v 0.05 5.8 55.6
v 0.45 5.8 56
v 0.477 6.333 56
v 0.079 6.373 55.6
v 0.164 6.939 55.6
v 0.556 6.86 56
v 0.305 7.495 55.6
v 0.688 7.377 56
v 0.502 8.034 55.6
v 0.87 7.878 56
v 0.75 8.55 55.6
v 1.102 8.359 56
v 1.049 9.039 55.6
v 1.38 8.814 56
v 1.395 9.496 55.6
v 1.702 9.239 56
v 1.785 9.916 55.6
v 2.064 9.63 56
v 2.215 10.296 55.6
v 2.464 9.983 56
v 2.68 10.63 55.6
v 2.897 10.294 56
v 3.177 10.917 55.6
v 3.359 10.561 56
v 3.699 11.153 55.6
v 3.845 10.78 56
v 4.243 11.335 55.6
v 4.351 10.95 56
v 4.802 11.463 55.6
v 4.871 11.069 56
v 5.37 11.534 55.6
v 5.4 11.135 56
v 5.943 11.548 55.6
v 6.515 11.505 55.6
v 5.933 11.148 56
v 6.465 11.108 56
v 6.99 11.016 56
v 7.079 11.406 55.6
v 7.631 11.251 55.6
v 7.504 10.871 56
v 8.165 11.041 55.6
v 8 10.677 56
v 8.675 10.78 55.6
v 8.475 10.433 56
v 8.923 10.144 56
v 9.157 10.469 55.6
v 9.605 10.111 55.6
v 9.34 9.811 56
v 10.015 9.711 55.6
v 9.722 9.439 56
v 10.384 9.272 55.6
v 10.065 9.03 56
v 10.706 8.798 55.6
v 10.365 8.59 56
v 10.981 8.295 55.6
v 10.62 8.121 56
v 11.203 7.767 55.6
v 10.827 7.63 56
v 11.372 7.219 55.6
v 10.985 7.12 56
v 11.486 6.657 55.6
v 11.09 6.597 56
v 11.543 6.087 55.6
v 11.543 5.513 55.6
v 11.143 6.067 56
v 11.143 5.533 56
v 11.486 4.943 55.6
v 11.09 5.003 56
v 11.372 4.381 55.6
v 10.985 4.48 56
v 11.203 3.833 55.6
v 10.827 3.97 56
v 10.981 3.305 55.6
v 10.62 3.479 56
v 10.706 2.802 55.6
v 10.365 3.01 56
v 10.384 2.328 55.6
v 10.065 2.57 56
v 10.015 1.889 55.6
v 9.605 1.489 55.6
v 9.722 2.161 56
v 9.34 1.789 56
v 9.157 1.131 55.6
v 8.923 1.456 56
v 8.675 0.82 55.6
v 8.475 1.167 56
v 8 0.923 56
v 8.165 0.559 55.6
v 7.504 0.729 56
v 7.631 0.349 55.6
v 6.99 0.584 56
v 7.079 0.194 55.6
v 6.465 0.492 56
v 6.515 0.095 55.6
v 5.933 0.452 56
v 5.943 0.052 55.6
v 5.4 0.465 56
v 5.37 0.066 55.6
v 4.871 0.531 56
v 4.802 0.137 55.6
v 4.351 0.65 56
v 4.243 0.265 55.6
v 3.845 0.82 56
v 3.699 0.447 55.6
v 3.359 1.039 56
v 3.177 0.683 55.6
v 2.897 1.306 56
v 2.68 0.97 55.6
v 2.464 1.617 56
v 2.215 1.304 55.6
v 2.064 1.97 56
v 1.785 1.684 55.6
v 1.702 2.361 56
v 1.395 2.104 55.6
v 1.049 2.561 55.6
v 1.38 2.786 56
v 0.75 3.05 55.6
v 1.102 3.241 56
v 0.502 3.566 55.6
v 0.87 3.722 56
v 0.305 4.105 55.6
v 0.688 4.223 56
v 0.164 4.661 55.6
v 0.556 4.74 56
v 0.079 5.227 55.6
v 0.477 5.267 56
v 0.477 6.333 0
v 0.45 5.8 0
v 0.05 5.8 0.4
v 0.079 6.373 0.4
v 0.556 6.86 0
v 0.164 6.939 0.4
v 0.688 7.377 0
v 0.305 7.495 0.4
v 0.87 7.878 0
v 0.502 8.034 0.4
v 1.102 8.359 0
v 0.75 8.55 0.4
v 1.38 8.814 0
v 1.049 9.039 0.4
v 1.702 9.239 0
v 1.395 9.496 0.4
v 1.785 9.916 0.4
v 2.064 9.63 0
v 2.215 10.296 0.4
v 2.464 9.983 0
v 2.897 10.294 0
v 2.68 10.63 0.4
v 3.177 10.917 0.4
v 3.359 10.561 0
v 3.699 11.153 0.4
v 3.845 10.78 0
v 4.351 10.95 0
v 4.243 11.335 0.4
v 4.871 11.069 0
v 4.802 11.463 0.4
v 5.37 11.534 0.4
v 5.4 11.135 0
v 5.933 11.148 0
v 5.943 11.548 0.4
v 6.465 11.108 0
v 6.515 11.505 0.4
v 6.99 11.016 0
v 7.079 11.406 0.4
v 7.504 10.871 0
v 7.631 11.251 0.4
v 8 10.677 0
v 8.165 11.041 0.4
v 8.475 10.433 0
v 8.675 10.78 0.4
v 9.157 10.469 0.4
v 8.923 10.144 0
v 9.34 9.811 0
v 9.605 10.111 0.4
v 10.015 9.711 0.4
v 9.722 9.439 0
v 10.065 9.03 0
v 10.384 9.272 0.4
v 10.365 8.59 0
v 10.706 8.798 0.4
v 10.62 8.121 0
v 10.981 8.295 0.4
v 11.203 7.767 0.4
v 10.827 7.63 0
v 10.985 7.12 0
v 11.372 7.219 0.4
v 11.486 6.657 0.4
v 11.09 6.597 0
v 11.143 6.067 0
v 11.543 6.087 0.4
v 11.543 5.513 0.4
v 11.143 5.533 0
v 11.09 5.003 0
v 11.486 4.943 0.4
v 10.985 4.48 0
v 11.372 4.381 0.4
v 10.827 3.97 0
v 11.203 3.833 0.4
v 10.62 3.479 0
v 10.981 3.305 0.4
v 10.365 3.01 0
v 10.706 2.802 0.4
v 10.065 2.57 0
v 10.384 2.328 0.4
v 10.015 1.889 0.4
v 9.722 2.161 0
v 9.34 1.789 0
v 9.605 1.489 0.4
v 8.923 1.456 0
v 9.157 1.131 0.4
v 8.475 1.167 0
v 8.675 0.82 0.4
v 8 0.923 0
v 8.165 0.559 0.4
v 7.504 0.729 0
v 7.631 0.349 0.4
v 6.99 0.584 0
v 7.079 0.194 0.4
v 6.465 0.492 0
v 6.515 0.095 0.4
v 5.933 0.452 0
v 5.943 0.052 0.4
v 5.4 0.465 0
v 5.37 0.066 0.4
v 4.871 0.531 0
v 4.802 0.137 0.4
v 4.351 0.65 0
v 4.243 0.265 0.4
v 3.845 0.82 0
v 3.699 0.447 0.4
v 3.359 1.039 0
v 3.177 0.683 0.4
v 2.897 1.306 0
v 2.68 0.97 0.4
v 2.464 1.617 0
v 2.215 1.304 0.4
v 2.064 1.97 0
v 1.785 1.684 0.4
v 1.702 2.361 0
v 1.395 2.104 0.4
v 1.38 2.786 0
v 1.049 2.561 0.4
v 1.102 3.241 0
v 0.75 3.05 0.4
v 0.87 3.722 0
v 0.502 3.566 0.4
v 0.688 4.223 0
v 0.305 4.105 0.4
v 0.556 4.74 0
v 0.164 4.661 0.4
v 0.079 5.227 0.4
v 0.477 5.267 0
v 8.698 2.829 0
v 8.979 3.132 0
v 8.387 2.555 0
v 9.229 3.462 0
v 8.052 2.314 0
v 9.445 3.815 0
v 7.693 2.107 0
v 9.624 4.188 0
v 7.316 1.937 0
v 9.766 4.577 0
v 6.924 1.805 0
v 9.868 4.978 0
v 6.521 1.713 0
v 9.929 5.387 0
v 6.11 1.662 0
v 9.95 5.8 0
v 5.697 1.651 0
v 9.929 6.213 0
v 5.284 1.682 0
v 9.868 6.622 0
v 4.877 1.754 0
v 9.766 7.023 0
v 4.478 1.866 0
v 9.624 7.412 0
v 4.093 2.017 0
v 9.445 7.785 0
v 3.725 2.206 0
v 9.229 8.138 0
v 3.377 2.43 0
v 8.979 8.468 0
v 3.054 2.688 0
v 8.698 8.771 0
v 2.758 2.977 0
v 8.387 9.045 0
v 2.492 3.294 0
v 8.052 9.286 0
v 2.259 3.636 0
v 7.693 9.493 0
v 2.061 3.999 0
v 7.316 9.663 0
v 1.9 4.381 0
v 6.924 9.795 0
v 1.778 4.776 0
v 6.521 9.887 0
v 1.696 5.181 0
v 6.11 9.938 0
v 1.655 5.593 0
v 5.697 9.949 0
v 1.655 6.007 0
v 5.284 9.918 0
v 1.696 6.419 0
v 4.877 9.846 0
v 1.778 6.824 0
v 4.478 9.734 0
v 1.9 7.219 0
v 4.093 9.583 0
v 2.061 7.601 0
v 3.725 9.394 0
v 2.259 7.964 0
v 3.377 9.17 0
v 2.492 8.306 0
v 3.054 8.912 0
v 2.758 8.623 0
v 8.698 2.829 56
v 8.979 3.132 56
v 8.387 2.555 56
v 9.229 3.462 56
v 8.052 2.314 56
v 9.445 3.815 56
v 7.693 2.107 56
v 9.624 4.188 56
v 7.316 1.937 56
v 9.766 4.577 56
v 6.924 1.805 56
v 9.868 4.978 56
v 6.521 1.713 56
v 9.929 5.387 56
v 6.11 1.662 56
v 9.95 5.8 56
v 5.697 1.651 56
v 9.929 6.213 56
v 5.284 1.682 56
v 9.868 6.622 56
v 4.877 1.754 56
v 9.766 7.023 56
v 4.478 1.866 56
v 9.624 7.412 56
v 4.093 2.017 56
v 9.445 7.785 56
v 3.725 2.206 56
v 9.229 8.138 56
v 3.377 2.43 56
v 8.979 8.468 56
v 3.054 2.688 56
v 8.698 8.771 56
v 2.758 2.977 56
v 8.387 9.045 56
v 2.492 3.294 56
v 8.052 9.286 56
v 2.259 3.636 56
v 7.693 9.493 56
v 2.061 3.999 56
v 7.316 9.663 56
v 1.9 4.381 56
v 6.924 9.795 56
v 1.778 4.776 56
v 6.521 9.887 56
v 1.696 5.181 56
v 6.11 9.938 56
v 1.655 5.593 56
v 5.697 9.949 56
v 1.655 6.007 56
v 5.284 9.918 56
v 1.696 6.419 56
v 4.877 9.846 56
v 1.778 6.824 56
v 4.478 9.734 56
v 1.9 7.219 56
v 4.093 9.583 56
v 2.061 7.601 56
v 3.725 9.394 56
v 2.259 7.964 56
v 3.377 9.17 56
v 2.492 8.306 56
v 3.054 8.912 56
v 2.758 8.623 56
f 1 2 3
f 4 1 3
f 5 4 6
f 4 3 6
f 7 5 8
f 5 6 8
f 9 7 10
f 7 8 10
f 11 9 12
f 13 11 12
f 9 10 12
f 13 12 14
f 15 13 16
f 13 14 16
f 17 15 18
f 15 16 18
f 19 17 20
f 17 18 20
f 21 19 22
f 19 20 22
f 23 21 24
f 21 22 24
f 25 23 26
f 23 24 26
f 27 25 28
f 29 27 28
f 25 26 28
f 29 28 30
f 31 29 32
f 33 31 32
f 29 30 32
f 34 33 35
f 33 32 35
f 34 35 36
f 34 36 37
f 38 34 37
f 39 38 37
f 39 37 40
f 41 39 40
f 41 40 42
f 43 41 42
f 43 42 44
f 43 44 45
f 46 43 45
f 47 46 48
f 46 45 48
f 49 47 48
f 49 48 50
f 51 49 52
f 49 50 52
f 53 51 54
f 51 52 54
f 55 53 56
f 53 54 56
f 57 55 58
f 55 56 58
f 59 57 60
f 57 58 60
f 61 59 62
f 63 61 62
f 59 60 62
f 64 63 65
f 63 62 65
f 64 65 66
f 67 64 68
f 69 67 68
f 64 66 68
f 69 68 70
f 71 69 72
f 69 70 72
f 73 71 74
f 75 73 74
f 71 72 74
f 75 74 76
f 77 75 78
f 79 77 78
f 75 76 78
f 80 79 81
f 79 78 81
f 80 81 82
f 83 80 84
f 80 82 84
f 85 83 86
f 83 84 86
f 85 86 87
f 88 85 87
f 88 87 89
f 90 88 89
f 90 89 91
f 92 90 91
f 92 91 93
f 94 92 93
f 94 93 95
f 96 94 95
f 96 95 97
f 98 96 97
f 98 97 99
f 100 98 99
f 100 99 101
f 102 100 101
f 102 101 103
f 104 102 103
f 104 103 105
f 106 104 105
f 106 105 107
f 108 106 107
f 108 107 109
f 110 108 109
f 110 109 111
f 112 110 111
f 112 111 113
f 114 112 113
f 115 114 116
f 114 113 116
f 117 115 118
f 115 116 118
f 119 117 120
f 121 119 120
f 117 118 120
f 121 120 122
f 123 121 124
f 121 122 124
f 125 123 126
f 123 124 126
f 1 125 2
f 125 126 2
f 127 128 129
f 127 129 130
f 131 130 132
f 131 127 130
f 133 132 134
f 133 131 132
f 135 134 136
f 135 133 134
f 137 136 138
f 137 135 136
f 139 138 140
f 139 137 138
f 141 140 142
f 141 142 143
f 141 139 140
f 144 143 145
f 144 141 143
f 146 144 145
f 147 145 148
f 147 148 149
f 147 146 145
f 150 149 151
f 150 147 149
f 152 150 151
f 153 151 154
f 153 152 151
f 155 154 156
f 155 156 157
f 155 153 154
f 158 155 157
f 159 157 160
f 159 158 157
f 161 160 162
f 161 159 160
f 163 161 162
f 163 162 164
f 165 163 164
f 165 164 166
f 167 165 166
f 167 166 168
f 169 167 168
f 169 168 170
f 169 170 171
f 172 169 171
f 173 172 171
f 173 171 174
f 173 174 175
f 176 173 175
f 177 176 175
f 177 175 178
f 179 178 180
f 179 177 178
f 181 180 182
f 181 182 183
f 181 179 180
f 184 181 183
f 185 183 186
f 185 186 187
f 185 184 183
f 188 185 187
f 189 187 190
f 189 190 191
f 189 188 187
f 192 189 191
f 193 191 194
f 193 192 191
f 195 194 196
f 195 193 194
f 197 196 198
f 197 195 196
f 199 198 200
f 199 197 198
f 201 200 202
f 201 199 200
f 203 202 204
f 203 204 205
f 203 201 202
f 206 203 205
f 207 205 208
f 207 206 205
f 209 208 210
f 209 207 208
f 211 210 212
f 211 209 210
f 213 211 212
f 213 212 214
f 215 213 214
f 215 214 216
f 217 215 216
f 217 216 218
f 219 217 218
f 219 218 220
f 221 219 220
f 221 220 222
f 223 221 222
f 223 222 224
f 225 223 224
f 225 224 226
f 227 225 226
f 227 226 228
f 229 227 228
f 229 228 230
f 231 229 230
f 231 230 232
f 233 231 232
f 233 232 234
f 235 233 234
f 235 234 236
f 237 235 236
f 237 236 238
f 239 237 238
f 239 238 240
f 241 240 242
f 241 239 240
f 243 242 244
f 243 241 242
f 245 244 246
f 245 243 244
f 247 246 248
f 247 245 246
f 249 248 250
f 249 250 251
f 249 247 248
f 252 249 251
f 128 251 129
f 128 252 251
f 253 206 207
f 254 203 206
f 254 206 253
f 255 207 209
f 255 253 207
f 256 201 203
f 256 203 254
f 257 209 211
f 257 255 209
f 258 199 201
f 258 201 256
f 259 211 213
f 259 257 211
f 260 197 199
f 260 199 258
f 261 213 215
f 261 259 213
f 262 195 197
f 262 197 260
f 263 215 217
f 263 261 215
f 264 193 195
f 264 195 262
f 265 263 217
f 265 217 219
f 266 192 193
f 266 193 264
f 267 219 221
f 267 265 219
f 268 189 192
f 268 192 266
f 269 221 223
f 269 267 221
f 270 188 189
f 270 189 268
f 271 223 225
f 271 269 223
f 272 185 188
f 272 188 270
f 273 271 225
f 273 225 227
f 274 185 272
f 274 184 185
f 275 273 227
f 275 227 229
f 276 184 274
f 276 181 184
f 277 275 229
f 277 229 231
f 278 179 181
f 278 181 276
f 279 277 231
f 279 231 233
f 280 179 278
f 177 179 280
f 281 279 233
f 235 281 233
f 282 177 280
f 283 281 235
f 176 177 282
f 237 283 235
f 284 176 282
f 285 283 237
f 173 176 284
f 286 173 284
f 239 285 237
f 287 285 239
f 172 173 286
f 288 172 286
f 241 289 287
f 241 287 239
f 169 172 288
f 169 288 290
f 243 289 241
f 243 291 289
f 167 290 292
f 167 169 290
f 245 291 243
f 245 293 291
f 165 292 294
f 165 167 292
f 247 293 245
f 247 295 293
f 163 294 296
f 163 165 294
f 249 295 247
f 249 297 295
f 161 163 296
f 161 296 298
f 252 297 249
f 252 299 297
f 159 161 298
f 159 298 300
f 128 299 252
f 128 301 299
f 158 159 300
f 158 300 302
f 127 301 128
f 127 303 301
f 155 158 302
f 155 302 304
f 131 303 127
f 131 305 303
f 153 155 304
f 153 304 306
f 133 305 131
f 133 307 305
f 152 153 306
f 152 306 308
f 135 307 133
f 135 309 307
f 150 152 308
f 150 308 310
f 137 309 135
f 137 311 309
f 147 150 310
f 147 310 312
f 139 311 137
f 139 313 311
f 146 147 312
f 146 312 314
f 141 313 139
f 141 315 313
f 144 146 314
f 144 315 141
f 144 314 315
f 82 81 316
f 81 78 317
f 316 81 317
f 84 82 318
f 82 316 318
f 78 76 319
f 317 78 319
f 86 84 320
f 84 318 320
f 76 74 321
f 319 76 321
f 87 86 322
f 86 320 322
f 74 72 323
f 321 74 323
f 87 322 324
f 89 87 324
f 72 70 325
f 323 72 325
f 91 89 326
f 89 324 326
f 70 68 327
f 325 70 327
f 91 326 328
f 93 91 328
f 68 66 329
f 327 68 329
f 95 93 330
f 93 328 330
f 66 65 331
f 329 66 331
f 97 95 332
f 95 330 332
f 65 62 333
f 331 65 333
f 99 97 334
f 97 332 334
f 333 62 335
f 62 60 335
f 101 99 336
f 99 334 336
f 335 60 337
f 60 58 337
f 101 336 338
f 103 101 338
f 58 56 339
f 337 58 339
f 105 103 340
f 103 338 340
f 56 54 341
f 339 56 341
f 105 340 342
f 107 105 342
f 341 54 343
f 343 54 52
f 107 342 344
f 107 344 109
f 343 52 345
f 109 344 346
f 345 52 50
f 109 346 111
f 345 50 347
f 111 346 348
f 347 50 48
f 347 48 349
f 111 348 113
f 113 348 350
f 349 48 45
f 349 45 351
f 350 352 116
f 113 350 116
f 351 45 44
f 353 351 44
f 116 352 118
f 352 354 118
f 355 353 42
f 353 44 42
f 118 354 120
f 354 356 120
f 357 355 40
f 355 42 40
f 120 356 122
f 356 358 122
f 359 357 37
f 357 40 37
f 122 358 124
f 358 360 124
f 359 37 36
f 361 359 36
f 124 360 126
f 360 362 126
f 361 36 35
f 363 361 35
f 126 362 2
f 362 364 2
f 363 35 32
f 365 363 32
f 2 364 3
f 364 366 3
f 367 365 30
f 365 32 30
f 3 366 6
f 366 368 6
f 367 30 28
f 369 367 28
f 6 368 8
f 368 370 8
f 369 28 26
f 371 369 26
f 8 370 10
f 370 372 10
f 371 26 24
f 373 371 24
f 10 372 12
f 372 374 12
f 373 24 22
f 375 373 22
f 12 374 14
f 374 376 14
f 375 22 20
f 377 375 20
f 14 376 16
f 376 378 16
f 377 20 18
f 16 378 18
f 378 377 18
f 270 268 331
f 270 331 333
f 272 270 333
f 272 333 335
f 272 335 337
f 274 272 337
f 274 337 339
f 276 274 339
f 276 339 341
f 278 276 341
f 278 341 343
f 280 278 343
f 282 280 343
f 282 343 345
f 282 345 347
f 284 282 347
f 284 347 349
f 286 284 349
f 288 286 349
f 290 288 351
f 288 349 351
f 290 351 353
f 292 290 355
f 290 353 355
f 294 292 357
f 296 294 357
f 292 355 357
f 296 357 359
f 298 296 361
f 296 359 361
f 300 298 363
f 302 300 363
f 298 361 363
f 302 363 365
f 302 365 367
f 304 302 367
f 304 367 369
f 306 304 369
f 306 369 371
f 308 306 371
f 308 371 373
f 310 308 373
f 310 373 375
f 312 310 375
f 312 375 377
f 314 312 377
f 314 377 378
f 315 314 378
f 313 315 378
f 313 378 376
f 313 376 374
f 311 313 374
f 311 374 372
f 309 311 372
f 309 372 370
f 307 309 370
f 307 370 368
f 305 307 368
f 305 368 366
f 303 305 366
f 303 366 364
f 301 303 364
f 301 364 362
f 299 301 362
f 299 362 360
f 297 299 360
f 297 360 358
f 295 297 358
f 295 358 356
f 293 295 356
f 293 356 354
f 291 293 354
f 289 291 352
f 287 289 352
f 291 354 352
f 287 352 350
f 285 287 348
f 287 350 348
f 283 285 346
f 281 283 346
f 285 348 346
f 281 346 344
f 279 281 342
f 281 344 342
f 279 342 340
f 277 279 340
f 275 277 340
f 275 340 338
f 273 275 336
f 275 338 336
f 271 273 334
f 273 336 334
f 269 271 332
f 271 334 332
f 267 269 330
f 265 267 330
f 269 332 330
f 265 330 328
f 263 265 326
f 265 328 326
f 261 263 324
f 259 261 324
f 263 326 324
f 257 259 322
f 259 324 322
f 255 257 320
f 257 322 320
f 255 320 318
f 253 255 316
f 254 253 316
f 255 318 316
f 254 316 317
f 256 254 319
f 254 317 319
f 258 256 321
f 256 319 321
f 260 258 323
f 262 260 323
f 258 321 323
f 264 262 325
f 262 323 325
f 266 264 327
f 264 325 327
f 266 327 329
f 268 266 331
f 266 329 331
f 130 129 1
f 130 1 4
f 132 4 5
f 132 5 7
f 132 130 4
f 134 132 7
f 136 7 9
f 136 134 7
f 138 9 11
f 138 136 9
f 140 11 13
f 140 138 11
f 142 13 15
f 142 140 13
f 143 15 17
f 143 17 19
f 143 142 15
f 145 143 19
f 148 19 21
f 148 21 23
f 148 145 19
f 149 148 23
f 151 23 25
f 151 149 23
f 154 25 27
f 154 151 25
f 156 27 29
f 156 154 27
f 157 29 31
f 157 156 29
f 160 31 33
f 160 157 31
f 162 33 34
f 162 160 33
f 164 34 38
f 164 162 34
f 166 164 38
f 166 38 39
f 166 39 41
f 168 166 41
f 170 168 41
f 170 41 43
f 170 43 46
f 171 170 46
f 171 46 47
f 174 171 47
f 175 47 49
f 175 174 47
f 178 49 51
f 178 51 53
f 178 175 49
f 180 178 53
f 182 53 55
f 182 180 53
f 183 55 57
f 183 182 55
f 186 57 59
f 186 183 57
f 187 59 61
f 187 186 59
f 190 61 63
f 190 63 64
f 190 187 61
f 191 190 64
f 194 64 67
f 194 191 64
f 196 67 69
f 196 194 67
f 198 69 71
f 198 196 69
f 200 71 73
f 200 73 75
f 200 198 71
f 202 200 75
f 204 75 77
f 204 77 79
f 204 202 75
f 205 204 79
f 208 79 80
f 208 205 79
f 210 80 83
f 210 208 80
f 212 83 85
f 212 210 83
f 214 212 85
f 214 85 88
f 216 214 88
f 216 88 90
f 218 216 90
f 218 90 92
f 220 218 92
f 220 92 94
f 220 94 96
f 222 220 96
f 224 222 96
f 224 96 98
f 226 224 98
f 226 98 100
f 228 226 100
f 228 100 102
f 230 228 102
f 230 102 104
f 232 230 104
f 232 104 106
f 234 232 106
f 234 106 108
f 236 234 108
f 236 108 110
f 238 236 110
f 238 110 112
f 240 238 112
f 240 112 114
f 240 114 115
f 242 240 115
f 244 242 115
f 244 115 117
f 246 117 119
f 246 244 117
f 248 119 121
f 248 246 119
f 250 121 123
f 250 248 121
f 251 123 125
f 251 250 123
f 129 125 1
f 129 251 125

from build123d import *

# Parameters (mm, degrees)
CROQUIS1_R              = 5.75
SALIENTE_EXTRUIR1_DEPTH = 56
CROQUIS2_R              = 4.15
CORTAR_EXTRUIR1_DEPTH   = 59.333566666
CHAFL_N1_SIZE           = 0.4
CHAFL_N2_SIZE           = 0.4


with BuildPart() as part:
    # Croquis1 → Saliente-Extruir1 (new body)
    with BuildSketch(Plane(origin=(0, 0, 0), x_dir=(-1, 0, 0), z_dir=(0, 0, -1))):
        with Locations((-5.8, 5.8)):
            Circle(CROQUIS1_R)
    extrude(amount=-SALIENTE_EXTRUIR1_DEPTH)

    # Croquis2 → Cortar-Extruir1 (cut, through all)
    with BuildSketch(Plane.XY.offset(56)):
        with Locations((5.8, 5.8)):
            Circle(CROQUIS2_R)
    extrude(amount=-CORTAR_EXTRUIR1_DEPTH, mode=Mode.SUBTRACT)

    # Chaflán1
    chafl_n1_edges = [part.edges().sort_by_distance(p)[0] for p in [
        (11.55, 5.8, 0),
    ]]
    chamfer(chafl_n1_edges, length=CHAFL_N1_SIZE)

    # Chaflán2
    chafl_n2_edges = [part.edges().sort_by_distance(p)[0] for p in [
        (11.55, 5.8, 56),
    ]]
    chamfer(chafl_n2_edges, length=CHAFL_N2_SIZE)


solid = part.part
